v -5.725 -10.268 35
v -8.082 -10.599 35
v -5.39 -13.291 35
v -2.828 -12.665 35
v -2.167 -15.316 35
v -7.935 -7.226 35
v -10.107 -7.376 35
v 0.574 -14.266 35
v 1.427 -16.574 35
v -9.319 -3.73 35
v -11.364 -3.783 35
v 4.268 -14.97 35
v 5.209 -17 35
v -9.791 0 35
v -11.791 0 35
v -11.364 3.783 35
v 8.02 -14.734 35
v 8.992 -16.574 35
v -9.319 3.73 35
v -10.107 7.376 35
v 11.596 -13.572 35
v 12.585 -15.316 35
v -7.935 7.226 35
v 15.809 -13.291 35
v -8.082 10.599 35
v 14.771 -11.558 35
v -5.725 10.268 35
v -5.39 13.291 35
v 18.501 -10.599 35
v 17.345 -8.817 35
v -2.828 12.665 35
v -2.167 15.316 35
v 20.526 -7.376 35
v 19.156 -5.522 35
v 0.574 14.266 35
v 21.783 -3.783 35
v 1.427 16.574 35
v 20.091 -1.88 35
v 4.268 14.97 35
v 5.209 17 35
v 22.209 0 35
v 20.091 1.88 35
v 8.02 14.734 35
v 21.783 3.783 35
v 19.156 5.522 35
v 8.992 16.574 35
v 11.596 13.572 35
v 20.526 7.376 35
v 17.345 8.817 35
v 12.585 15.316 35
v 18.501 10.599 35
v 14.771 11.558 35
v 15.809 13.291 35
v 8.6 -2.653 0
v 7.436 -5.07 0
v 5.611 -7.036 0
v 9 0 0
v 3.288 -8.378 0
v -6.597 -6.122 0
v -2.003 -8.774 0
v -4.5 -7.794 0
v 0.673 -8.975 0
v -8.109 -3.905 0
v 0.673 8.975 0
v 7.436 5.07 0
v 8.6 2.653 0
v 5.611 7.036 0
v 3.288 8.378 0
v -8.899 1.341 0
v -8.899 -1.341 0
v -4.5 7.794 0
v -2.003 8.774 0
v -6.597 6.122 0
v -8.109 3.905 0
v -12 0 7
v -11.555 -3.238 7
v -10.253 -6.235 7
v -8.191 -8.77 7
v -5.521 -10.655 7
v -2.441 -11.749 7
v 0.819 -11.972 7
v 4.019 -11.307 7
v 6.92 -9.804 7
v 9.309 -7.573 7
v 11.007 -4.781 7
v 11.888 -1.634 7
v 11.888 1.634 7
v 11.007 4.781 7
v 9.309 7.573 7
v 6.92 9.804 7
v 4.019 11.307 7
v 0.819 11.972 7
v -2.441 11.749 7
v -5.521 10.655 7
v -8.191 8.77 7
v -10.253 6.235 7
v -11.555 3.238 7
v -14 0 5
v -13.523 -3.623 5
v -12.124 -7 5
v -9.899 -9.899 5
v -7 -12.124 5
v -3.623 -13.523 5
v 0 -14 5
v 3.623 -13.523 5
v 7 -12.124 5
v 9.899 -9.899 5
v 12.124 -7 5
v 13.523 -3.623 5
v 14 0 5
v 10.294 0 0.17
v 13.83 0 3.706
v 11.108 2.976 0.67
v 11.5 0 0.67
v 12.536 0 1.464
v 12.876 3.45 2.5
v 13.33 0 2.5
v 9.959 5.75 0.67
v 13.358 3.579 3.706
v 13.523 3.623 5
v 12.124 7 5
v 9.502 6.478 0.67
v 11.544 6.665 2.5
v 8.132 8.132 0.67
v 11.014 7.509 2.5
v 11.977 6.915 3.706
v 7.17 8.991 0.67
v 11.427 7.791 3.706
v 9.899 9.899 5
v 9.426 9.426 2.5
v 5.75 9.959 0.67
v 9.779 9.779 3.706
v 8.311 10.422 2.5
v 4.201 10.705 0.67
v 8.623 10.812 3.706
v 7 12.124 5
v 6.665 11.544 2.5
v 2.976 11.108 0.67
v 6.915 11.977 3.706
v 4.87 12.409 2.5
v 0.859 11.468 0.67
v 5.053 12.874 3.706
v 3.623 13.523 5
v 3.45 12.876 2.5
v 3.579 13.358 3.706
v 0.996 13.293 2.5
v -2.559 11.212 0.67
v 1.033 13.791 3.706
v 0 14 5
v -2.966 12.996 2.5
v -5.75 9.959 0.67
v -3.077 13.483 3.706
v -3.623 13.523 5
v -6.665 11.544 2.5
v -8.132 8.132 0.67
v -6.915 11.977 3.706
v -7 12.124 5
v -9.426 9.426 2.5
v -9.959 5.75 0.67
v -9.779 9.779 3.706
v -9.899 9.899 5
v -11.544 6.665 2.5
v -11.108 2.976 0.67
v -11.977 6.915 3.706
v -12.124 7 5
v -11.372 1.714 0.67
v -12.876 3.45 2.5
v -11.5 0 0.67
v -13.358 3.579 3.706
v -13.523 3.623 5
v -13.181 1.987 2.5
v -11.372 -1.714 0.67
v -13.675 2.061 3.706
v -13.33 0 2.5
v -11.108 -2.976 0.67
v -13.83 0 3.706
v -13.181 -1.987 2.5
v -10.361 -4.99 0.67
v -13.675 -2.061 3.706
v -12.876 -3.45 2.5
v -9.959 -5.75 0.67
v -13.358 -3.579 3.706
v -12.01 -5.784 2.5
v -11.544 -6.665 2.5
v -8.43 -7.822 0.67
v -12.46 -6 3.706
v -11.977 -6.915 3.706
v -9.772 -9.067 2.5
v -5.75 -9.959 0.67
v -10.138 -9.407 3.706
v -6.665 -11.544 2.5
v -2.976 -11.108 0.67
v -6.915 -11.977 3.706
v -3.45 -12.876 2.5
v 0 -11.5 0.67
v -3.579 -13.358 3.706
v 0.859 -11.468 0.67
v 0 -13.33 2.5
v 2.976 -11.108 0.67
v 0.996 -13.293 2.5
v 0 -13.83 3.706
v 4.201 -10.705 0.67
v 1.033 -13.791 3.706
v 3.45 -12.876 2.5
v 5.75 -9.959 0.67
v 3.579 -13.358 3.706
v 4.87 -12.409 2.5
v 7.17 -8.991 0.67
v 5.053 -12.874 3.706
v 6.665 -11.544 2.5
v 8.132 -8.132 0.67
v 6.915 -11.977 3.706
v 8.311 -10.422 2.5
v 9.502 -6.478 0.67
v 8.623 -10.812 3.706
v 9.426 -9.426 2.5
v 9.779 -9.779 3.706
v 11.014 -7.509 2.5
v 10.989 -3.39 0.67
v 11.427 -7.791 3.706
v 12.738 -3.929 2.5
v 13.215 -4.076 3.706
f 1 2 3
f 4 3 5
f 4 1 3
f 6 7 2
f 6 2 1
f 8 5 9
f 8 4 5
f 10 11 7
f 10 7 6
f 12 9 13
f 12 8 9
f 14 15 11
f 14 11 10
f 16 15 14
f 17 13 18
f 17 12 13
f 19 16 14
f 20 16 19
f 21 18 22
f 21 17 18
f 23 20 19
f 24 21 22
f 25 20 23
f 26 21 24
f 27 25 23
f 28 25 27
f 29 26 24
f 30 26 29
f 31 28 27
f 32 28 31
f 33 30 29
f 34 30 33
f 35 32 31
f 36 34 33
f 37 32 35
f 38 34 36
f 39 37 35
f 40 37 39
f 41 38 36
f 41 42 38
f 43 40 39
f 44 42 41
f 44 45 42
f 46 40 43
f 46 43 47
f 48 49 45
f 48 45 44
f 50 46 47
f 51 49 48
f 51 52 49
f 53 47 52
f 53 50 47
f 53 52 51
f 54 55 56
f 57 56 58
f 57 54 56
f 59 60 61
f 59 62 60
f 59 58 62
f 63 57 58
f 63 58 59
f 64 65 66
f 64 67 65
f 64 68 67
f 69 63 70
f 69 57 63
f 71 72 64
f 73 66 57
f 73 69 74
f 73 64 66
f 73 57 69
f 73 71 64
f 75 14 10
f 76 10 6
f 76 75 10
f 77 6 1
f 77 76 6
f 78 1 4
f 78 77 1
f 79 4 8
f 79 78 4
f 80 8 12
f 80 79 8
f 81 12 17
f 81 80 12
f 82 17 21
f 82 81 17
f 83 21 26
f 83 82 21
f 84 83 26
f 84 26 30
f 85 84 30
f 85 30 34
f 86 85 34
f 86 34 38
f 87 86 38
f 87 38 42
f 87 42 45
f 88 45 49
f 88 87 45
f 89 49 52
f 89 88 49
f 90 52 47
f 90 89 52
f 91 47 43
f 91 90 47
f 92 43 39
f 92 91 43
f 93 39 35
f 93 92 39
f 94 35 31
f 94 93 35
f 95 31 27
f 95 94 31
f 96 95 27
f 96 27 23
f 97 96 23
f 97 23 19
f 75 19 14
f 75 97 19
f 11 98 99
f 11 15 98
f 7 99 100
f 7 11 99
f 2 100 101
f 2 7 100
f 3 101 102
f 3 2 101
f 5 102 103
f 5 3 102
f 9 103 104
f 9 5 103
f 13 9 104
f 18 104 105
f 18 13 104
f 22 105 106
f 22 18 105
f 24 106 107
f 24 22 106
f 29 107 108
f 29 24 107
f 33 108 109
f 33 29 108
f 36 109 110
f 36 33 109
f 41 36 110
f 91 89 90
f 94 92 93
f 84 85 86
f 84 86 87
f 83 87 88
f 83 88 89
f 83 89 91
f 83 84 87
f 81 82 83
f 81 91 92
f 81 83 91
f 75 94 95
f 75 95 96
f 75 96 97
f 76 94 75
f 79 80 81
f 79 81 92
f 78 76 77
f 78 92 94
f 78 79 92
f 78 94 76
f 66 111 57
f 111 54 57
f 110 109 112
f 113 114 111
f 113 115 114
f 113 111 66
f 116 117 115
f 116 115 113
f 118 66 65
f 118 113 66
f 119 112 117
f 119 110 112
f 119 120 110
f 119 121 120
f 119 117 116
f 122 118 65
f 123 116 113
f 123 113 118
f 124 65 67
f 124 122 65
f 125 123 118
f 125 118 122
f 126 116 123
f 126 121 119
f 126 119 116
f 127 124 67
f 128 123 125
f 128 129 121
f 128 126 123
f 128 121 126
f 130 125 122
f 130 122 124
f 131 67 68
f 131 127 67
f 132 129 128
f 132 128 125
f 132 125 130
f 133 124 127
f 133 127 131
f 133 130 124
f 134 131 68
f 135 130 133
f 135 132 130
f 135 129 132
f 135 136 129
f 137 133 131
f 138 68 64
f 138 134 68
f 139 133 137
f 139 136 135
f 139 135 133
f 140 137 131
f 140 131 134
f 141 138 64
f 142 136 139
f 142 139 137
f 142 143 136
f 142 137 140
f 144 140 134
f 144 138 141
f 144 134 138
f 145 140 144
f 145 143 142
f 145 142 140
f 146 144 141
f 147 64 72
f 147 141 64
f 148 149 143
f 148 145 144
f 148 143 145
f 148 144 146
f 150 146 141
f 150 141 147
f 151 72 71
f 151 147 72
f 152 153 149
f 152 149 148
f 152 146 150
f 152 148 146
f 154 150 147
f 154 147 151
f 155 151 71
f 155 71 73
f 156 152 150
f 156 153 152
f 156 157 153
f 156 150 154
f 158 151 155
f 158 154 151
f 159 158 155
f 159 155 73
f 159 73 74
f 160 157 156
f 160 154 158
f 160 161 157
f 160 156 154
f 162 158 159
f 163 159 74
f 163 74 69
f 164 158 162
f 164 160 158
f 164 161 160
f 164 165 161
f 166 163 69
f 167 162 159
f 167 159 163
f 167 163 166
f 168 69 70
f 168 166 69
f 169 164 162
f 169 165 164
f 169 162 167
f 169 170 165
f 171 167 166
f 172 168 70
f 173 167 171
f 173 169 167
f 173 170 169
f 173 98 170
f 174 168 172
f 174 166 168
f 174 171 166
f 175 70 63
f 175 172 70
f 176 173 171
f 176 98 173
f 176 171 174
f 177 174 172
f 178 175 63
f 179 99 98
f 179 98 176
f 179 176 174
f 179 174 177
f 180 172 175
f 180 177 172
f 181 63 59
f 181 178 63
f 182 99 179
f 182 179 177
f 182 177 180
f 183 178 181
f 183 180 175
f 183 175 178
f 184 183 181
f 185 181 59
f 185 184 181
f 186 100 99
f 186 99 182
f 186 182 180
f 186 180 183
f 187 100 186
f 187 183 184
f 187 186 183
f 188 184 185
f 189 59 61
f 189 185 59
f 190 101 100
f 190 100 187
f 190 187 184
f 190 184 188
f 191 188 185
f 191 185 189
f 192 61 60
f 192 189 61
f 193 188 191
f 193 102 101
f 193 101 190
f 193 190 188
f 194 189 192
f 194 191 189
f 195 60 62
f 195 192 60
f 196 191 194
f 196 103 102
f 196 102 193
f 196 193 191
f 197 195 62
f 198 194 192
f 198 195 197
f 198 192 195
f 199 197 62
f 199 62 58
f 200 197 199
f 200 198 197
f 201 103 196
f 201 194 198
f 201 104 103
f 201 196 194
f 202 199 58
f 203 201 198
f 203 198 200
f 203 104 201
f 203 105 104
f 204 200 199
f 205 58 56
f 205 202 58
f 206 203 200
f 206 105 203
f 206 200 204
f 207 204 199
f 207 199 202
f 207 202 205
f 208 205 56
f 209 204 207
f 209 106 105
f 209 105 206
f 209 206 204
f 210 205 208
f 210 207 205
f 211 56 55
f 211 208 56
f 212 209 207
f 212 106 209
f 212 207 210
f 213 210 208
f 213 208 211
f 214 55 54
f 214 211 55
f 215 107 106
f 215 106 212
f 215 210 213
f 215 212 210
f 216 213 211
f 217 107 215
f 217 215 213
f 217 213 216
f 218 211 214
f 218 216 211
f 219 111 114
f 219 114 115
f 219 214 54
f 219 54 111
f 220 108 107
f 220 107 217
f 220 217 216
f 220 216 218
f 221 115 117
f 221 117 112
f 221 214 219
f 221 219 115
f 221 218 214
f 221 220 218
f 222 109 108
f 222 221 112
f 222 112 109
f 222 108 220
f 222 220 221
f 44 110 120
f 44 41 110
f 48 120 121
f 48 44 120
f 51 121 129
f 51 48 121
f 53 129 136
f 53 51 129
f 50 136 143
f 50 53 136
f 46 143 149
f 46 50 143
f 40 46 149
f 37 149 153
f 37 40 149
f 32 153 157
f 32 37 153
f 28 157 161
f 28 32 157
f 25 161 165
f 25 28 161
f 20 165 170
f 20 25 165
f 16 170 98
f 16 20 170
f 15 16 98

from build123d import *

# Parameters (mm, degrees)
SKETCH001_R = 14
SKETCH003_R = 17
SKETCH005_R = 15
SKETCH004_R = 12


with BuildPart() as part:
    # Sketch → Revolution (revolve)
    with BuildSketch(Plane.XZ):
        with BuildLine():
            Line((0, 5), (14, 5))
            ThreePointArc((9, 0), (12.535534, 1.464466), (14, 5))
            Line((0, 0), (9, 0))
            Line((0, 5), (0, 0))
        make_face()
    revolve(axis=Axis((0, 0, 0), (0, 0, 1)))

    # Sketch001 (on Face1 of Revolution) → AdditiveLoft section 0
    with BuildSketch(Plane(origin=(0, 0, 5), x_dir=(-1, 0, 0), z_dir=(0, 0, 1))):
        Circle(SKETCH001_R)
    # Sketch003 → AdditiveLoft section 1
    with BuildSketch(Plane.XY.offset(35)):
        with Locations((5.209445, 0)):
            Circle(SKETCH003_R)
    loft()

    # Sketch005 (on Face5 of AdditiveLoft) → SubtractiveLoft section 0
    with BuildSketch(Plane(origin=(0, 0, 35), x_dir=(-1, 0, 0), z_dir=(0, 0, 1))):
        with Locations((-5.209445, 0)):
            Circle(SKETCH005_R)
    # Sketch004 (on Face1 of Revolution) → SubtractiveLoft section 1
    with BuildSketch(Plane(origin=(0, 0, 7), x_dir=(-1, 0, 0), z_dir=(0, 0, 1))):
        Circle(SKETCH004_R)
    loft(mode=Mode.SUBTRACT)


solid = part.part
